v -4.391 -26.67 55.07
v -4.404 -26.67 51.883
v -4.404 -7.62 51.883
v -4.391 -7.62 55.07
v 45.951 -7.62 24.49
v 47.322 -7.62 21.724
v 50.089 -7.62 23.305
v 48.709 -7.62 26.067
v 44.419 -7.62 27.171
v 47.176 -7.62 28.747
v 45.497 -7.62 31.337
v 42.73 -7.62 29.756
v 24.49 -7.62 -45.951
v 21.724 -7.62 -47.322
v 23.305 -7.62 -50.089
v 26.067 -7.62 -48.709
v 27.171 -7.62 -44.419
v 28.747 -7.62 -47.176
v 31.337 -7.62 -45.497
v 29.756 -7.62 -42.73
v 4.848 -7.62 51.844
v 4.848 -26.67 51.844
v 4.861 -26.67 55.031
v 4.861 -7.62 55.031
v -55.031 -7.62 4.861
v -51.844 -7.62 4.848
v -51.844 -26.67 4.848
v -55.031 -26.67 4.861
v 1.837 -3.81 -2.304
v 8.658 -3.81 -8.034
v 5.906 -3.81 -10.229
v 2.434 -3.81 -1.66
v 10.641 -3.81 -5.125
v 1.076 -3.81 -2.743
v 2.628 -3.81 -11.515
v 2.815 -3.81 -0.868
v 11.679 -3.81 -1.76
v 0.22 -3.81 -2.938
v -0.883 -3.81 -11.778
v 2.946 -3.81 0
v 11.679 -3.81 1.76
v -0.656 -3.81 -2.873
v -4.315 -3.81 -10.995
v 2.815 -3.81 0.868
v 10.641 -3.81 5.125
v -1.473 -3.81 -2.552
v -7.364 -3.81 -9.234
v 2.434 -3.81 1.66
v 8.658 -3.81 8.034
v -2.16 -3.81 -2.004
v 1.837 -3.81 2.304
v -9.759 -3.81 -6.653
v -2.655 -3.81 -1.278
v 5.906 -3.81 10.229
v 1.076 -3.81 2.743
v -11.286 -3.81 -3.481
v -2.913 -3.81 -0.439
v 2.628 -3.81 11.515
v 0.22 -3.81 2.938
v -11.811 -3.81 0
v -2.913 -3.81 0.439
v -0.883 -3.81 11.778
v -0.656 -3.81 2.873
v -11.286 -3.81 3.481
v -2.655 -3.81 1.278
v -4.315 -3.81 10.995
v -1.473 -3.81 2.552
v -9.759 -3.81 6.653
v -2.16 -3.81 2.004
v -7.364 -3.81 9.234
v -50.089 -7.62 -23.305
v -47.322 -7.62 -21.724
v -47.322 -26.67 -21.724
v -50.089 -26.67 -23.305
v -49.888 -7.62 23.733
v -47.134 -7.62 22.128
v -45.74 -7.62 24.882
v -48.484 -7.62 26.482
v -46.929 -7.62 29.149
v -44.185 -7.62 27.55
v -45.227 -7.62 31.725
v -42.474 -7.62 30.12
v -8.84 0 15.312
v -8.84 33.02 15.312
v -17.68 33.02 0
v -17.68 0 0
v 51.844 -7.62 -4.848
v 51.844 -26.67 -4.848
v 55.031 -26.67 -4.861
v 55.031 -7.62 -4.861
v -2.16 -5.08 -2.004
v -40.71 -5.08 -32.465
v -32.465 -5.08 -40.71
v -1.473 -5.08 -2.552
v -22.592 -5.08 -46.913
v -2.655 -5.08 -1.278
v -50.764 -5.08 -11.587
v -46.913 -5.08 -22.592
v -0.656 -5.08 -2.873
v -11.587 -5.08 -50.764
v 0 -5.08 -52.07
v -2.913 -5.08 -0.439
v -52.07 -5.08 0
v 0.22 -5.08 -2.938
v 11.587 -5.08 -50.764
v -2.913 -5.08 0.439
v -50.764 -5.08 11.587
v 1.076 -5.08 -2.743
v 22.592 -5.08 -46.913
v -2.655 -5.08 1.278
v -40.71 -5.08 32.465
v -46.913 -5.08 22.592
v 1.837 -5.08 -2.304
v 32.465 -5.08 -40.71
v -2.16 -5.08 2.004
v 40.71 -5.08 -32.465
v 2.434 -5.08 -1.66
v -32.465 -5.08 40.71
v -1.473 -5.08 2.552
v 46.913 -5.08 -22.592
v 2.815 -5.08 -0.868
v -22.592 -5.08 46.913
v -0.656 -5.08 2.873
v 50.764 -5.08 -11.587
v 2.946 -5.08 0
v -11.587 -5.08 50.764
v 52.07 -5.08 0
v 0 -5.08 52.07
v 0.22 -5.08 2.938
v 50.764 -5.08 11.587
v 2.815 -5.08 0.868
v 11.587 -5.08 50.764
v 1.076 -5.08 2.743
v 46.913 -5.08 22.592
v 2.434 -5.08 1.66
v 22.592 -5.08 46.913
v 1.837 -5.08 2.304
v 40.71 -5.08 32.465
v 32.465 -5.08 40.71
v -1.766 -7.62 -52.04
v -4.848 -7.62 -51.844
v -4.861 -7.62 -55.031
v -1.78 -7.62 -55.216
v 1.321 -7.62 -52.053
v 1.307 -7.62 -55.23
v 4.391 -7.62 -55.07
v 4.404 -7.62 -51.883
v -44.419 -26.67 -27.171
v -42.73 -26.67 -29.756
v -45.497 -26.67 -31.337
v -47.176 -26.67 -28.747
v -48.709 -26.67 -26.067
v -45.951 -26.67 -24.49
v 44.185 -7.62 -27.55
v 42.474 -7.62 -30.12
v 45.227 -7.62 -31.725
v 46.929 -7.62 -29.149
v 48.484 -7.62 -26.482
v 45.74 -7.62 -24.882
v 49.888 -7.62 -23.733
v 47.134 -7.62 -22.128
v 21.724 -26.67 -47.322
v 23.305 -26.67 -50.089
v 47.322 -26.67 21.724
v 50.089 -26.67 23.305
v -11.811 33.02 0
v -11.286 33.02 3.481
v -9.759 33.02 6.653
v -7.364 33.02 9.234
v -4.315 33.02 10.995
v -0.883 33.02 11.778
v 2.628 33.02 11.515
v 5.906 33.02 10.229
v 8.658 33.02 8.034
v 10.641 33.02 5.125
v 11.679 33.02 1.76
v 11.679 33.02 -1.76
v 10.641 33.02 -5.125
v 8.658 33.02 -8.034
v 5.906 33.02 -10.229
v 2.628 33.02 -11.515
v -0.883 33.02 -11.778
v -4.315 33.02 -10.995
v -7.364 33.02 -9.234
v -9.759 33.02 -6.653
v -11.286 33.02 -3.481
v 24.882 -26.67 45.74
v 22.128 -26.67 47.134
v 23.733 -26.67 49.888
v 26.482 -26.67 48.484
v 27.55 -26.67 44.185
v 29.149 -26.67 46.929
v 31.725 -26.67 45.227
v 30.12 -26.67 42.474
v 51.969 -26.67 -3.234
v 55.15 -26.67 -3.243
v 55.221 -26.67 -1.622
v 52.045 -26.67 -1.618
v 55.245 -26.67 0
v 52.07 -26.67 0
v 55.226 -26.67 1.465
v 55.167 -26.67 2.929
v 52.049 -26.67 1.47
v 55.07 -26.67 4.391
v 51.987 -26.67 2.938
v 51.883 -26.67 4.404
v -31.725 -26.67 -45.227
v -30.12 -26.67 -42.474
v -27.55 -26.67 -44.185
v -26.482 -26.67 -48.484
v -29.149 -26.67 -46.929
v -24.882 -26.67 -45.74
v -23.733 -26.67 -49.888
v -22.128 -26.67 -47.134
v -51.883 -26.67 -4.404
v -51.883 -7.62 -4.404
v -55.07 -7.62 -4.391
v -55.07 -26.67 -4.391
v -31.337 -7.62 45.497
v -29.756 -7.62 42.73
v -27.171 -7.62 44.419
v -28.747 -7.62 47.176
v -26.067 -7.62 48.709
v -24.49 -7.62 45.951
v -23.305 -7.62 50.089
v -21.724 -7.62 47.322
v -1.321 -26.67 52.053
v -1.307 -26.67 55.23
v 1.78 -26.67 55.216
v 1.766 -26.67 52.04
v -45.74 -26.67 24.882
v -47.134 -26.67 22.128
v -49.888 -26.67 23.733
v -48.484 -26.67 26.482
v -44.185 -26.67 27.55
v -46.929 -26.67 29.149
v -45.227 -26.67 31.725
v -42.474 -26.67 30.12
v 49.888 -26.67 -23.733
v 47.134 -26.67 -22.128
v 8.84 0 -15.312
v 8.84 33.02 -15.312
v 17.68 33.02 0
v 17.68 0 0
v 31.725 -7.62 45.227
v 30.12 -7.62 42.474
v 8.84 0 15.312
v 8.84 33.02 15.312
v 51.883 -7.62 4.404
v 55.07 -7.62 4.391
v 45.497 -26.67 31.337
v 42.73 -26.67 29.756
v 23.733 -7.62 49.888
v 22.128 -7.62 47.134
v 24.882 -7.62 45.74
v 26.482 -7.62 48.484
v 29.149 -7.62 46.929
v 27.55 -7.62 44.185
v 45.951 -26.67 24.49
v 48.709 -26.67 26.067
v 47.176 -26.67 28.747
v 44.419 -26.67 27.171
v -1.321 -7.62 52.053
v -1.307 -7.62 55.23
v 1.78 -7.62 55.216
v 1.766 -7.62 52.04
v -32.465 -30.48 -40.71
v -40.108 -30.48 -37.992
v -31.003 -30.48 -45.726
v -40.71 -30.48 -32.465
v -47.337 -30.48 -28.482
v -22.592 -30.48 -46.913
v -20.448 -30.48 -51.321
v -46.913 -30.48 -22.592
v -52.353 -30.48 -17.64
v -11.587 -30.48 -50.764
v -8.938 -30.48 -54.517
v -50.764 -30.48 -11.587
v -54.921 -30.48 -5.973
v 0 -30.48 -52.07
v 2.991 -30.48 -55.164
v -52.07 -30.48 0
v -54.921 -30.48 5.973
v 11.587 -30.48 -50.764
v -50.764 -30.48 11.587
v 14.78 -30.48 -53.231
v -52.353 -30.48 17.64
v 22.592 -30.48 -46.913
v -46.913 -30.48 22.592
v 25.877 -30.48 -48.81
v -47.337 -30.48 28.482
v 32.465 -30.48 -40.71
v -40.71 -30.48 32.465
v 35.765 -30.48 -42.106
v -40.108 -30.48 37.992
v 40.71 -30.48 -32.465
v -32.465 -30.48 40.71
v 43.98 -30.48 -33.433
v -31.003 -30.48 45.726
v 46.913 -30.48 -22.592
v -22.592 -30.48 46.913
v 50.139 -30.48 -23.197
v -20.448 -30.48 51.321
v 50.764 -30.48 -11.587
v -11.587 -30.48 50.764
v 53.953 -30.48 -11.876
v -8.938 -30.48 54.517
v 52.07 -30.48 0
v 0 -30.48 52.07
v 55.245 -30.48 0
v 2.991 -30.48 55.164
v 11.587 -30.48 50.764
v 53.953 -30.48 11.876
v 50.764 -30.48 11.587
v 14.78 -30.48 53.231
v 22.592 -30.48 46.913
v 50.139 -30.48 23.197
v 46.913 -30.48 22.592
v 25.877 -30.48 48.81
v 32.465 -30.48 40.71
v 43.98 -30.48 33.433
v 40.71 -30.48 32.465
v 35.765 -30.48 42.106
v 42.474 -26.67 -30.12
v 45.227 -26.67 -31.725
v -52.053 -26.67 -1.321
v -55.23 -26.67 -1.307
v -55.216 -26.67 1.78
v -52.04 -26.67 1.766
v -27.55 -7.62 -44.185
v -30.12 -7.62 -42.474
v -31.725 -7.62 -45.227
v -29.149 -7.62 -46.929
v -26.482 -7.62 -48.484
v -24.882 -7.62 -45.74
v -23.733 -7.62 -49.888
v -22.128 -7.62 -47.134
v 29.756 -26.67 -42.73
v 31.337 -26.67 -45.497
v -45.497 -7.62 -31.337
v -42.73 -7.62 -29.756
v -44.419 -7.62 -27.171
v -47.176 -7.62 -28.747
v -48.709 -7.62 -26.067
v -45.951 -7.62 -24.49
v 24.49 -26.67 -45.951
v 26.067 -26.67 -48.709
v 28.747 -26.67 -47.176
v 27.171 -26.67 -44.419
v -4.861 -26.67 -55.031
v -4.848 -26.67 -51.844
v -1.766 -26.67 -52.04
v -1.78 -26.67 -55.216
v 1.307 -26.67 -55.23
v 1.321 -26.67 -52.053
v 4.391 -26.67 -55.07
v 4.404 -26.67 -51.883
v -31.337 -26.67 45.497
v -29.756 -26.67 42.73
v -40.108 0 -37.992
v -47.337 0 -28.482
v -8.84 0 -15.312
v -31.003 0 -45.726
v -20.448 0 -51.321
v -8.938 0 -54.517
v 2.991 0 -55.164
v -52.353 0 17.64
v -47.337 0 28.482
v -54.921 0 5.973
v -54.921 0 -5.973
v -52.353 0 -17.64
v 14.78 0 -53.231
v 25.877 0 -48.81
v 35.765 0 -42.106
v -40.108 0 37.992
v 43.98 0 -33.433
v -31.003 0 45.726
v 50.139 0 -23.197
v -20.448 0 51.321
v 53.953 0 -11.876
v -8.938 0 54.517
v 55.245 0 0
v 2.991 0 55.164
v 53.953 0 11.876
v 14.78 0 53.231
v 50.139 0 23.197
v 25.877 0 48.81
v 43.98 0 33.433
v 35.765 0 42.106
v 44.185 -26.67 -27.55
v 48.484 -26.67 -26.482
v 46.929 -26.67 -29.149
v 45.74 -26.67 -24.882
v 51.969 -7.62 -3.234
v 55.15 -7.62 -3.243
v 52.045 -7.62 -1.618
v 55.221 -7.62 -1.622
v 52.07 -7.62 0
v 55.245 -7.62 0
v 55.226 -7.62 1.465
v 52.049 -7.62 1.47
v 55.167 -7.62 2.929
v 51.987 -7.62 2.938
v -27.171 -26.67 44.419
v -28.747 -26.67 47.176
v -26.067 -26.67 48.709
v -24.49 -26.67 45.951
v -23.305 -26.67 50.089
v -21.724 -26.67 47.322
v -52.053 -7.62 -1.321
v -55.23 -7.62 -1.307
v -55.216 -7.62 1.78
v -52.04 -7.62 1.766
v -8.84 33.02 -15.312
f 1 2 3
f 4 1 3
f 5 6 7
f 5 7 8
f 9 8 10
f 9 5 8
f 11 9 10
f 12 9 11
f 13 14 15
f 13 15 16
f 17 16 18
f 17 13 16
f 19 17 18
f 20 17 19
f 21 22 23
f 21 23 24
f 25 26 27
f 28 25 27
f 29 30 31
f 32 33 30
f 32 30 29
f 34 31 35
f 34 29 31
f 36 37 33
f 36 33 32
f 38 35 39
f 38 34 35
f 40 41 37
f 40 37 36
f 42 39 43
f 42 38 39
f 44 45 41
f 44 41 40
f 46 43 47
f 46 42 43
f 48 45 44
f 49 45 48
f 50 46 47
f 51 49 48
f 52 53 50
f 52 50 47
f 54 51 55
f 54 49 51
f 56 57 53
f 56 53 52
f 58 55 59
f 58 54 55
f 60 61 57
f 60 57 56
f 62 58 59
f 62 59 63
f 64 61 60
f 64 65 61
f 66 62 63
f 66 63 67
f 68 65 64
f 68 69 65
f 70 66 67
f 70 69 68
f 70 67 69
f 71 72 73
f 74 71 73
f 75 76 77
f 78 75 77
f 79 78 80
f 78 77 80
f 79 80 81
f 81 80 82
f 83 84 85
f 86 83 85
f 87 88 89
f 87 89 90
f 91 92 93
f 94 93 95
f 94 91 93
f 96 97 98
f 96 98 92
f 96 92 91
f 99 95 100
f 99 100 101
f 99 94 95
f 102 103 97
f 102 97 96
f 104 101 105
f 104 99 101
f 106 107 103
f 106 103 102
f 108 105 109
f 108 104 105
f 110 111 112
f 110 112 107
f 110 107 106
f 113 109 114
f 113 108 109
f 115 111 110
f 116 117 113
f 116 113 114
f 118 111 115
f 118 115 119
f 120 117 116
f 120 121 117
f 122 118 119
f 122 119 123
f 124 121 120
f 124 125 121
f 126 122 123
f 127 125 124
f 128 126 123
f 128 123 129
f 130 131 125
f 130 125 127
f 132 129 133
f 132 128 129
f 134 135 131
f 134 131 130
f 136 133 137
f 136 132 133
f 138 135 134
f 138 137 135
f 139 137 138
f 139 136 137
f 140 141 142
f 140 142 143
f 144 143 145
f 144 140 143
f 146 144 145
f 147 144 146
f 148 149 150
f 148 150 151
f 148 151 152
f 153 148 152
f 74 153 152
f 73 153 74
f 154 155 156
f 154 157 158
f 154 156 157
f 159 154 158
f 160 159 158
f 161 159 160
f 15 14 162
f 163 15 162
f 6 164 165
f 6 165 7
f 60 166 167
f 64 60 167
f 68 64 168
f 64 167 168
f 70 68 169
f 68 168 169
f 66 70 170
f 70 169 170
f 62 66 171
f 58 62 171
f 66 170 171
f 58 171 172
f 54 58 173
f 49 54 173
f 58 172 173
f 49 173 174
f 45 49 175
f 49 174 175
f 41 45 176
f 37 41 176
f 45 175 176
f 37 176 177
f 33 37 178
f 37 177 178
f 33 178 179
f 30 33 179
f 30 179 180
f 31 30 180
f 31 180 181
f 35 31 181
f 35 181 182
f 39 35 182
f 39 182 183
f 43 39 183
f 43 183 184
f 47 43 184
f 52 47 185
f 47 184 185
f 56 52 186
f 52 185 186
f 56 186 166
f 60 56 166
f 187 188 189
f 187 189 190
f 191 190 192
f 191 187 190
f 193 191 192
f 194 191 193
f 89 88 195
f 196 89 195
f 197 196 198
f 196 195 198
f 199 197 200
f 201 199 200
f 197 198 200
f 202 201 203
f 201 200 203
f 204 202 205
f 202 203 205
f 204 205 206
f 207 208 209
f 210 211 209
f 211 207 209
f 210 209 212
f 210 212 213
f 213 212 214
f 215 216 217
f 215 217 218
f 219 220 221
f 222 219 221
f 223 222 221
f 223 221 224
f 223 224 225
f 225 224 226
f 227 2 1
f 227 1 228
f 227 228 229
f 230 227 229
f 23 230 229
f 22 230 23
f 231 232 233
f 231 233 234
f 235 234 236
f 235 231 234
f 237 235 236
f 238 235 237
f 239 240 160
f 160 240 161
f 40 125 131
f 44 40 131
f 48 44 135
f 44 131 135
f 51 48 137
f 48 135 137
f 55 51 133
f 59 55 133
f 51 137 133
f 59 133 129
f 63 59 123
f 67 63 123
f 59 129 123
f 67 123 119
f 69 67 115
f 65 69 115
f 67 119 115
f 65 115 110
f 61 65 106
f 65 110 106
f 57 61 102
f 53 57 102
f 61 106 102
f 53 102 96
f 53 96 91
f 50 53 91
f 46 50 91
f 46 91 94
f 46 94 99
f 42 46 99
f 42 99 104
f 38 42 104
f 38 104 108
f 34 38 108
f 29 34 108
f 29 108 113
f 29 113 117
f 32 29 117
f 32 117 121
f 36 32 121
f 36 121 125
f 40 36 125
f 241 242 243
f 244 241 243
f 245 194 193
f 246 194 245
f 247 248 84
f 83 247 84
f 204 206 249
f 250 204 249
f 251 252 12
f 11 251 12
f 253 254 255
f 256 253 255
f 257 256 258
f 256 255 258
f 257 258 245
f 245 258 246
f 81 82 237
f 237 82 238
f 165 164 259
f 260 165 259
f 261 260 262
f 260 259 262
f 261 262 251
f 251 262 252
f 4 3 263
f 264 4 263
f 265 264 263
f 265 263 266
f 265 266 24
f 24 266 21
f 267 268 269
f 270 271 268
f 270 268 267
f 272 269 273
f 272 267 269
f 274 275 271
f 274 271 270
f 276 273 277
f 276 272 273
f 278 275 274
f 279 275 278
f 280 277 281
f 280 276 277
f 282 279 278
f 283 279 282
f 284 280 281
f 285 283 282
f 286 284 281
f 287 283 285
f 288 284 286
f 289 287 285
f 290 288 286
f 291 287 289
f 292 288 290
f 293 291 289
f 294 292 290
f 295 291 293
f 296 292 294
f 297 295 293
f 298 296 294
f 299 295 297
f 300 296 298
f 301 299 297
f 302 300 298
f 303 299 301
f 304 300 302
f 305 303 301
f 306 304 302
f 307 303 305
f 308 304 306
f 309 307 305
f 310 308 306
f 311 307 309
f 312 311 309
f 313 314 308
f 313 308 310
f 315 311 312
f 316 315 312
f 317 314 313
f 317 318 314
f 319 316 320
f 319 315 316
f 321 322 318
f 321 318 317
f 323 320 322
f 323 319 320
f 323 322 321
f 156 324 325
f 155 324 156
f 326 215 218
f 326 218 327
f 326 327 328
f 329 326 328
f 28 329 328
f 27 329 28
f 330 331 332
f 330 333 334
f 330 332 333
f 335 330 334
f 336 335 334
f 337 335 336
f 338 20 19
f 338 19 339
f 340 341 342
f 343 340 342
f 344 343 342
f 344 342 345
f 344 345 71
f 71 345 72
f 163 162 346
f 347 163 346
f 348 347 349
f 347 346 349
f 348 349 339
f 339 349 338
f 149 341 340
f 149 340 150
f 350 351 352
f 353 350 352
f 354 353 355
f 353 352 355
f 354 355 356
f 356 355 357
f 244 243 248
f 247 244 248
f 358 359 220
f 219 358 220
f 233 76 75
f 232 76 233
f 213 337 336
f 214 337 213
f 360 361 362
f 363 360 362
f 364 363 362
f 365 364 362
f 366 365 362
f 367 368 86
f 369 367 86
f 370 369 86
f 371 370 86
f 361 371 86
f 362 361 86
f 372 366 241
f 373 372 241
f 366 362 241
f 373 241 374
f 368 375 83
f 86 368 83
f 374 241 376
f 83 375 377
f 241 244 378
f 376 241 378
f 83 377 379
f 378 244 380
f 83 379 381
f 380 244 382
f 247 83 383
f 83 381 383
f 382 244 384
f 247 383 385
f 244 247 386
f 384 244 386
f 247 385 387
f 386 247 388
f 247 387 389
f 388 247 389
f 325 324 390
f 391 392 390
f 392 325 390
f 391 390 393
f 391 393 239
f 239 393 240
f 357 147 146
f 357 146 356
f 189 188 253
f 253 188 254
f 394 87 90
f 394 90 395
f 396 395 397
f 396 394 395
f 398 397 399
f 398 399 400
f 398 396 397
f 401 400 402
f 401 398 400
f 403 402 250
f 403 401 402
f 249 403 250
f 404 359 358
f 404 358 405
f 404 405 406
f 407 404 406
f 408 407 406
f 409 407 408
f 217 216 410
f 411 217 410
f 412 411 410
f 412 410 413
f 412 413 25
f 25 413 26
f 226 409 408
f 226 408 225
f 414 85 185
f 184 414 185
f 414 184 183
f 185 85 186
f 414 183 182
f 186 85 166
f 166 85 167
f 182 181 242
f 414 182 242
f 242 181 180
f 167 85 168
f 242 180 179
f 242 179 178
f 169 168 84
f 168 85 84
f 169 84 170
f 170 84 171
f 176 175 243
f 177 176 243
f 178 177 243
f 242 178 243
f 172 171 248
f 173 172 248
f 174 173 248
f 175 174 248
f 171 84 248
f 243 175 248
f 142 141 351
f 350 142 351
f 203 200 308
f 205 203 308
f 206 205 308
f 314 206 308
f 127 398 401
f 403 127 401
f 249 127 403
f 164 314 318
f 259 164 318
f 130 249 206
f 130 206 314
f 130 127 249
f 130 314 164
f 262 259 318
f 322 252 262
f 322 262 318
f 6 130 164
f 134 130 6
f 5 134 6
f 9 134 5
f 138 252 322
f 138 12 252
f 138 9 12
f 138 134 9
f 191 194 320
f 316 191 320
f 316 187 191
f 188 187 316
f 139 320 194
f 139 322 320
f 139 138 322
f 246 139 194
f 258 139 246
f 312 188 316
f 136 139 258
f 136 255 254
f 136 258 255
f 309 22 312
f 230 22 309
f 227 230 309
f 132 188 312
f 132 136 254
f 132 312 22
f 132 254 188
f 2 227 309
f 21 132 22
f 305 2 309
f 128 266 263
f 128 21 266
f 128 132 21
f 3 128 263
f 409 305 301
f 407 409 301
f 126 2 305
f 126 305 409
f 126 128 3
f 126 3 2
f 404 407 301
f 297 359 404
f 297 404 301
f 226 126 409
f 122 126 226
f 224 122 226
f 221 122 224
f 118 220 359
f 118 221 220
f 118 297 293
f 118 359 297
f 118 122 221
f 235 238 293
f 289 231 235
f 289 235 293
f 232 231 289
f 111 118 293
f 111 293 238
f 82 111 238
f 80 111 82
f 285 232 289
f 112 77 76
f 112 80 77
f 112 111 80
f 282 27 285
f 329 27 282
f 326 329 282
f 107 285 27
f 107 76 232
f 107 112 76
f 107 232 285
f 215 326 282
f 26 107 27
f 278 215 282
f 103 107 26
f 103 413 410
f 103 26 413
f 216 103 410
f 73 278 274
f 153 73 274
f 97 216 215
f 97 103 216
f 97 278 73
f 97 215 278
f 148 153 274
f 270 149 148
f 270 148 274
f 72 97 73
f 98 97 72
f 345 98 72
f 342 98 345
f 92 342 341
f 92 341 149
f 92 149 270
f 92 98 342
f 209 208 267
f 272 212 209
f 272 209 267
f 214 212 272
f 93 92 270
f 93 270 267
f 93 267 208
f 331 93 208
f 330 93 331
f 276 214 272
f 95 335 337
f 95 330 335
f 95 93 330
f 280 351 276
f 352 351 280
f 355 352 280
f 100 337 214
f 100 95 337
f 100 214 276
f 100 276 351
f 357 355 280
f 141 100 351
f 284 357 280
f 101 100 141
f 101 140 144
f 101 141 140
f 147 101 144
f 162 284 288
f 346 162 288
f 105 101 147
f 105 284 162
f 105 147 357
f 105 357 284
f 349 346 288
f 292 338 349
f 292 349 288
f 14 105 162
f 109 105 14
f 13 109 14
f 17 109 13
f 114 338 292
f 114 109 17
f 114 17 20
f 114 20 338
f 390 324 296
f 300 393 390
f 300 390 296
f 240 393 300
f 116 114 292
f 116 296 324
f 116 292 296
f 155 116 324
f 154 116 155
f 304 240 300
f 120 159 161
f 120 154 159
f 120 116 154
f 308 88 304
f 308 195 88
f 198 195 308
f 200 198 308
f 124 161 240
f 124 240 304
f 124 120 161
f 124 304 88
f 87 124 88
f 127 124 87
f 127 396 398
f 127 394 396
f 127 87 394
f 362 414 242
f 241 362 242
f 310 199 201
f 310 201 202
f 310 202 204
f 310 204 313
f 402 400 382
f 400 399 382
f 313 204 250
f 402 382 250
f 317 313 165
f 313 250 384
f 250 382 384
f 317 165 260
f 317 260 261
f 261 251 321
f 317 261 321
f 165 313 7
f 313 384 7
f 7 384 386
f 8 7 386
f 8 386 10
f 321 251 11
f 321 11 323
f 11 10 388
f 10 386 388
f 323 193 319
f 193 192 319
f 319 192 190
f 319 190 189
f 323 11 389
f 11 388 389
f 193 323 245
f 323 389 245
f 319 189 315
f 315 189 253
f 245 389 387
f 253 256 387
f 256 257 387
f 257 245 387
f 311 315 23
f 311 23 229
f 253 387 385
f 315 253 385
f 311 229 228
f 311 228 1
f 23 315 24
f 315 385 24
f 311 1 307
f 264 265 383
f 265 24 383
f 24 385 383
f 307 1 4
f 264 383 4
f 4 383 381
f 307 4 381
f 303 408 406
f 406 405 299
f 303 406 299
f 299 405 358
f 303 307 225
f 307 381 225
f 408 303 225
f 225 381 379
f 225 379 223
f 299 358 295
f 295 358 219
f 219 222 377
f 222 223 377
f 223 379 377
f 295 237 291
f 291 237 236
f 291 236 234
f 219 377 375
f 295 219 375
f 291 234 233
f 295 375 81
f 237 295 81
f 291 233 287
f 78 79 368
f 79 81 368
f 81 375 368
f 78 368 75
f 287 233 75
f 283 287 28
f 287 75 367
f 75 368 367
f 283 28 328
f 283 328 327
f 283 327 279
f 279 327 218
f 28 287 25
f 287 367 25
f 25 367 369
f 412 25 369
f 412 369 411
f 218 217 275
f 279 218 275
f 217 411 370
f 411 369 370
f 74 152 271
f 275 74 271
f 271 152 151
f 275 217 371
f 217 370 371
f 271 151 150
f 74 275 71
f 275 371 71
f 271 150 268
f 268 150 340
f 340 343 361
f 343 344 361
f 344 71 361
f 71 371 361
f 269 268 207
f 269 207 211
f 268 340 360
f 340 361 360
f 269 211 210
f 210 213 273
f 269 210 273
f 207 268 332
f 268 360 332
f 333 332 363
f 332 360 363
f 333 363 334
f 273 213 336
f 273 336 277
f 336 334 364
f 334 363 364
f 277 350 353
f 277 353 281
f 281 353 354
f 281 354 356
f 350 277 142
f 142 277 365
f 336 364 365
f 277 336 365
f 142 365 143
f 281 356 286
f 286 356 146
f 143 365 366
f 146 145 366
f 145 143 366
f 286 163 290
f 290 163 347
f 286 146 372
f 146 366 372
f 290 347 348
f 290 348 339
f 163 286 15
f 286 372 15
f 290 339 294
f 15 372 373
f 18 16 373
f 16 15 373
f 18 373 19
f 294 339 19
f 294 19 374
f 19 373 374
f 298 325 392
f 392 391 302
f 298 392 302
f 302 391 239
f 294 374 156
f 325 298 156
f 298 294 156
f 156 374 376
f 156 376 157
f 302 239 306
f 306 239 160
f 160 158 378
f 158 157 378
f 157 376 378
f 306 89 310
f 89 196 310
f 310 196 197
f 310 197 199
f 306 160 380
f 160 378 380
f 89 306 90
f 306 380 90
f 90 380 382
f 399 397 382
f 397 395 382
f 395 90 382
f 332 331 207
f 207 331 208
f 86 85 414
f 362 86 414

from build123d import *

# Parameters (mm, degrees)
F0_R      = 52.07
F1_DEPTH  = 5.08
F0_R_2    = 55.245
F2_DEPTH  = 30.48
F4_DEPTH  = 21.59
F5_W      = 9.2520020868
F5_H      = 19.05
F6_DEPTH  = 50.8
F7_W      = 9.2520020868
F7_H      = 19.05
F8_DEPTH  = 50.8
F9_W      = 9.2520020868
F9_H      = 19.05
F10_DEPTH = 50.8
F11_W     = 19.05
F11_H     = 9.2520020868
F12_DEPTH = 50.8
F13_W     = 19.05
F13_H     = 9.2520020868
F14_DEPTH = 50.8
F15_W     = 19.05
F15_H     = 9.2520020868
F16_DEPTH = 50.8
F17_W     = 9.2520020868
F17_H     = 19.05
F18_DEPTH = 50.8
F19_W     = 9.2520020868
F19_H     = 19.05
F20_DEPTH = 50.8
F21_W     = 9.2520020868
F21_H     = 19.05
F22_DEPTH = 50.8
F23_W     = 19.05
F23_H     = 9.2520020868
F24_DEPTH = 50.8
F25_W     = 19.05
F25_H     = 9.2520020868
F26_DEPTH = 50.8
F27_W     = 19.05
F27_H     = 9.2520020868
F28_DEPTH = 50.8
F29_W     = 40.64
F29_H     = 38.1
F30_DEPTH = 33.02
F31_DEPTH = 21.59
F33_R     = 2.9464
F34_DEPTH = 1.6256
F32_R     = 11.811
F35_DEPTH = 36.83
F36_W     = 40.64
F36_H     = 38.1
F37_DEPTH = 33.02


with BuildPart() as f1:
    # F0 (on Front) → F1 (new body)
    with BuildSketch(Plane.XZ):
        Circle(F0_R)
    extrude(amount=F1_DEPTH)

    # F0 (on Front) → F2 (join)
    with BuildSketch(Plane.XZ):
        Circle(F0_R_2)
        Circle(F0_R, mode=Mode.SUBTRACT)
    extrude(amount=F2_DEPTH)

    # F3 (on face) → F4 (join)
    with BuildSketch(Plane.XZ.offset(5.08)):
        Polygon((4.5521322669, -17.2840948262), (12.5843095976, -12.6923990675), (17.2445313344, -4.6997852286), (17.2840948262, 4.5521322669), (12.6923990675, 12.5843095976), (4.6997852286, 17.2445313344), (-4.5521322669, 17.2840948262), (-12.5843095976, 12.6923990675), (-17.2445313344, 4.6997852286), (-17.2840948262, -4.5521322669), (-12.6923990675, -12.5843095976), (-4.6997852286, -17.2445313344), align=None)
    extrude(amount=F4_DEPTH)

    # F5 (on face) → F6 (cut)
    with BuildSketch(Plane(origin=(8.696092148, 0, 14.914420466), x_dir=(0.8638793813, 0, -0.5036987339), z_dir=(0.5036987339, 0, 0.8638793813))):
        with Locations((0, -17.145)):
            Rectangle(F5_W, F5_H)
    extrude(amount=F6_DEPTH, mode=Mode.SUBTRACT)

    # F7 (on face) → F8 (cut)
    with BuildSketch(Plane(origin=(0.0738264808, 0, 17.2643130803), x_dir=(0.999990857, 0, -0.0042762087), z_dir=(0.0042762087, 0, 0.999990857))):
        with Locations((0, -17.145)):
            Rectangle(F7_W, F7_H)
    extrude(amount=F8_DEPTH, mode=Mode.SUBTRACT)

    # F9 (on face) → F10 (cut)
    with BuildSketch(Plane(origin=(-8.5682209323, 0, 14.9882469469), x_dir=(0.86815559, 0, 0.4962921231), z_dir=(-0.4962921231, 0, 0.86815559))):
        with Locations((0, -17.145)):
            Rectangle(F9_W, F9_H)
    extrude(amount=F10_DEPTH, mode=Mode.SUBTRACT)

    # F11 (on face) → F12 (cut)
    with BuildSketch(Plane(origin=(-14.914420466, 0, 8.696092148), x_dir=(0, -1, 0), z_dir=(-0.8638793813, 0, 0.5036987339))):
        with Locations((17.145, 0)):
            Rectangle(F11_W, F11_H)
    extrude(amount=F12_DEPTH, mode=Mode.SUBTRACT)

    # F13 (on face) → F14 (cut)
    with BuildSketch(Plane(origin=(-17.2643130803, 0, 0.0738264808), x_dir=(0, -1, 0), z_dir=(-0.999990857, 0, 0.0042762087))):
        with Locations((17.145, 0)):
            Rectangle(F13_W, F13_H)
    extrude(amount=F14_DEPTH, mode=Mode.SUBTRACT)

    # F15 (on face) → F16 (cut)
    with BuildSketch(Plane(origin=(-14.9882469469, 0, -8.5682209323), x_dir=(0, -1, 0), z_dir=(-0.86815559, 0, -0.4962921231))):
        with Locations((17.145, 0)):
            Rectangle(F15_W, F15_H)
    extrude(amount=F16_DEPTH, mode=Mode.SUBTRACT)

    # F17 (on face) → F18 (cut)
    with BuildSketch(Plane(origin=(-8.696092148, 0, -14.914420466), x_dir=(0.8638793813, 0, -0.5036987339), z_dir=(-0.5036987339, 0, -0.8638793813))):
        with Locations((0, 17.145)):
            Rectangle(F17_W, F17_H)
    extrude(amount=F18_DEPTH, mode=Mode.SUBTRACT)

    # F19 (on face) → F20 (cut)
    with BuildSketch(Plane(origin=(-0.0738264808, 0, -17.2643130803), x_dir=(0.999990857, 0, -0.0042762087), z_dir=(-0.0042762087, 0, -0.999990857))):
        with Locations((0, 17.145)):
            Rectangle(F19_W, F19_H)
    extrude(amount=F20_DEPTH, mode=Mode.SUBTRACT)

    # F21 (on face) → F22 (cut)
    with BuildSketch(Plane(origin=(8.5682209323, 0, -14.9882469469), x_dir=(0.86815559, 0, 0.4962921231), z_dir=(0.4962921231, 0, -0.86815559))):
        with Locations((0, 17.145)):
            Rectangle(F21_W, F21_H)
    extrude(amount=F22_DEPTH, mode=Mode.SUBTRACT)

    # F23 (on face) → F24 (cut)
    with BuildSketch(Plane(origin=(14.914420466, 0, -8.696092148), x_dir=(0, 1, 0), z_dir=(0.8638793813, 0, -0.5036987339))):
        with Locations((-17.145, 0)):
            Rectangle(F23_W, F23_H)
    extrude(amount=F24_DEPTH, mode=Mode.SUBTRACT)

    # F25 (on face) → F26 (cut)
    with BuildSketch(Plane(origin=(17.2643130803, 0, -0.0738264808), x_dir=(0, 1, 0), z_dir=(0.999990857, 0, -0.0042762087))):
        with Locations((-17.145, 0)):
            Rectangle(F25_W, F25_H)
    extrude(amount=F26_DEPTH, mode=Mode.SUBTRACT)

    # F27 (on face) → F28 (cut)
    with BuildSketch(Plane(origin=(14.9882469469, 0, 8.5682209323), x_dir=(0, 1, 0), z_dir=(0.86815559, 0, 0.4962921231))):
        with Locations((-17.145, 0)):
            Rectangle(F27_W, F27_H)
    extrude(amount=F28_DEPTH, mode=Mode.SUBTRACT)

    # F29 (on face) → F30 (join)
    with BuildSketch(Plane.XZ):
        with Locations((0.0789208158, 0.021902828)):
            Rectangle(F29_W, F29_H)
    extrude(amount=-F30_DEPTH)

    # F31 (cut): a face of the model
    f31_faces = [f1.faces().sort_by_distance(p)[0] for p in [
        (0, -26.67, 0),
    ]]
    extrude(f31_faces, amount=-F31_DEPTH, mode=Mode.SUBTRACT)

    # F33 (on face) → F34 (cut)
    with BuildSketch(Plane.XZ.offset(5.08)):
        Circle(F33_R)
    extrude(amount=-F34_DEPTH, mode=Mode.SUBTRACT)

    # F32 (on face) → F35 (cut)
    with BuildSketch(Plane(origin=(0, 33.02, 0), x_dir=(-1, 0, 0), z_dir=(0, 1, 0))):
        Circle(F32_R)
    extrude(amount=-F35_DEPTH, mode=Mode.SUBTRACT)

    # F36 (on face) → F37 (cut)
    with BuildSketch(Plane(origin=(0, 33.02, 0), x_dir=(-1, 0, 0), z_dir=(0, 1, 0))):
        with Locations((-0.0789208158, 0.021902828)):
            Rectangle(F36_W, F36_H)
        Polygon((17.6803887808, 0), (8.8401943904, -15.311665833), (-8.8401943904, -15.311665833), (-17.6803887808, 0), (-8.8401943904, 15.311665833), (8.8401943904, 15.311665833), align=None, mode=Mode.SUBTRACT)
    extrude(amount=-F37_DEPTH, mode=Mode.SUBTRACT)


solid = f1.part
